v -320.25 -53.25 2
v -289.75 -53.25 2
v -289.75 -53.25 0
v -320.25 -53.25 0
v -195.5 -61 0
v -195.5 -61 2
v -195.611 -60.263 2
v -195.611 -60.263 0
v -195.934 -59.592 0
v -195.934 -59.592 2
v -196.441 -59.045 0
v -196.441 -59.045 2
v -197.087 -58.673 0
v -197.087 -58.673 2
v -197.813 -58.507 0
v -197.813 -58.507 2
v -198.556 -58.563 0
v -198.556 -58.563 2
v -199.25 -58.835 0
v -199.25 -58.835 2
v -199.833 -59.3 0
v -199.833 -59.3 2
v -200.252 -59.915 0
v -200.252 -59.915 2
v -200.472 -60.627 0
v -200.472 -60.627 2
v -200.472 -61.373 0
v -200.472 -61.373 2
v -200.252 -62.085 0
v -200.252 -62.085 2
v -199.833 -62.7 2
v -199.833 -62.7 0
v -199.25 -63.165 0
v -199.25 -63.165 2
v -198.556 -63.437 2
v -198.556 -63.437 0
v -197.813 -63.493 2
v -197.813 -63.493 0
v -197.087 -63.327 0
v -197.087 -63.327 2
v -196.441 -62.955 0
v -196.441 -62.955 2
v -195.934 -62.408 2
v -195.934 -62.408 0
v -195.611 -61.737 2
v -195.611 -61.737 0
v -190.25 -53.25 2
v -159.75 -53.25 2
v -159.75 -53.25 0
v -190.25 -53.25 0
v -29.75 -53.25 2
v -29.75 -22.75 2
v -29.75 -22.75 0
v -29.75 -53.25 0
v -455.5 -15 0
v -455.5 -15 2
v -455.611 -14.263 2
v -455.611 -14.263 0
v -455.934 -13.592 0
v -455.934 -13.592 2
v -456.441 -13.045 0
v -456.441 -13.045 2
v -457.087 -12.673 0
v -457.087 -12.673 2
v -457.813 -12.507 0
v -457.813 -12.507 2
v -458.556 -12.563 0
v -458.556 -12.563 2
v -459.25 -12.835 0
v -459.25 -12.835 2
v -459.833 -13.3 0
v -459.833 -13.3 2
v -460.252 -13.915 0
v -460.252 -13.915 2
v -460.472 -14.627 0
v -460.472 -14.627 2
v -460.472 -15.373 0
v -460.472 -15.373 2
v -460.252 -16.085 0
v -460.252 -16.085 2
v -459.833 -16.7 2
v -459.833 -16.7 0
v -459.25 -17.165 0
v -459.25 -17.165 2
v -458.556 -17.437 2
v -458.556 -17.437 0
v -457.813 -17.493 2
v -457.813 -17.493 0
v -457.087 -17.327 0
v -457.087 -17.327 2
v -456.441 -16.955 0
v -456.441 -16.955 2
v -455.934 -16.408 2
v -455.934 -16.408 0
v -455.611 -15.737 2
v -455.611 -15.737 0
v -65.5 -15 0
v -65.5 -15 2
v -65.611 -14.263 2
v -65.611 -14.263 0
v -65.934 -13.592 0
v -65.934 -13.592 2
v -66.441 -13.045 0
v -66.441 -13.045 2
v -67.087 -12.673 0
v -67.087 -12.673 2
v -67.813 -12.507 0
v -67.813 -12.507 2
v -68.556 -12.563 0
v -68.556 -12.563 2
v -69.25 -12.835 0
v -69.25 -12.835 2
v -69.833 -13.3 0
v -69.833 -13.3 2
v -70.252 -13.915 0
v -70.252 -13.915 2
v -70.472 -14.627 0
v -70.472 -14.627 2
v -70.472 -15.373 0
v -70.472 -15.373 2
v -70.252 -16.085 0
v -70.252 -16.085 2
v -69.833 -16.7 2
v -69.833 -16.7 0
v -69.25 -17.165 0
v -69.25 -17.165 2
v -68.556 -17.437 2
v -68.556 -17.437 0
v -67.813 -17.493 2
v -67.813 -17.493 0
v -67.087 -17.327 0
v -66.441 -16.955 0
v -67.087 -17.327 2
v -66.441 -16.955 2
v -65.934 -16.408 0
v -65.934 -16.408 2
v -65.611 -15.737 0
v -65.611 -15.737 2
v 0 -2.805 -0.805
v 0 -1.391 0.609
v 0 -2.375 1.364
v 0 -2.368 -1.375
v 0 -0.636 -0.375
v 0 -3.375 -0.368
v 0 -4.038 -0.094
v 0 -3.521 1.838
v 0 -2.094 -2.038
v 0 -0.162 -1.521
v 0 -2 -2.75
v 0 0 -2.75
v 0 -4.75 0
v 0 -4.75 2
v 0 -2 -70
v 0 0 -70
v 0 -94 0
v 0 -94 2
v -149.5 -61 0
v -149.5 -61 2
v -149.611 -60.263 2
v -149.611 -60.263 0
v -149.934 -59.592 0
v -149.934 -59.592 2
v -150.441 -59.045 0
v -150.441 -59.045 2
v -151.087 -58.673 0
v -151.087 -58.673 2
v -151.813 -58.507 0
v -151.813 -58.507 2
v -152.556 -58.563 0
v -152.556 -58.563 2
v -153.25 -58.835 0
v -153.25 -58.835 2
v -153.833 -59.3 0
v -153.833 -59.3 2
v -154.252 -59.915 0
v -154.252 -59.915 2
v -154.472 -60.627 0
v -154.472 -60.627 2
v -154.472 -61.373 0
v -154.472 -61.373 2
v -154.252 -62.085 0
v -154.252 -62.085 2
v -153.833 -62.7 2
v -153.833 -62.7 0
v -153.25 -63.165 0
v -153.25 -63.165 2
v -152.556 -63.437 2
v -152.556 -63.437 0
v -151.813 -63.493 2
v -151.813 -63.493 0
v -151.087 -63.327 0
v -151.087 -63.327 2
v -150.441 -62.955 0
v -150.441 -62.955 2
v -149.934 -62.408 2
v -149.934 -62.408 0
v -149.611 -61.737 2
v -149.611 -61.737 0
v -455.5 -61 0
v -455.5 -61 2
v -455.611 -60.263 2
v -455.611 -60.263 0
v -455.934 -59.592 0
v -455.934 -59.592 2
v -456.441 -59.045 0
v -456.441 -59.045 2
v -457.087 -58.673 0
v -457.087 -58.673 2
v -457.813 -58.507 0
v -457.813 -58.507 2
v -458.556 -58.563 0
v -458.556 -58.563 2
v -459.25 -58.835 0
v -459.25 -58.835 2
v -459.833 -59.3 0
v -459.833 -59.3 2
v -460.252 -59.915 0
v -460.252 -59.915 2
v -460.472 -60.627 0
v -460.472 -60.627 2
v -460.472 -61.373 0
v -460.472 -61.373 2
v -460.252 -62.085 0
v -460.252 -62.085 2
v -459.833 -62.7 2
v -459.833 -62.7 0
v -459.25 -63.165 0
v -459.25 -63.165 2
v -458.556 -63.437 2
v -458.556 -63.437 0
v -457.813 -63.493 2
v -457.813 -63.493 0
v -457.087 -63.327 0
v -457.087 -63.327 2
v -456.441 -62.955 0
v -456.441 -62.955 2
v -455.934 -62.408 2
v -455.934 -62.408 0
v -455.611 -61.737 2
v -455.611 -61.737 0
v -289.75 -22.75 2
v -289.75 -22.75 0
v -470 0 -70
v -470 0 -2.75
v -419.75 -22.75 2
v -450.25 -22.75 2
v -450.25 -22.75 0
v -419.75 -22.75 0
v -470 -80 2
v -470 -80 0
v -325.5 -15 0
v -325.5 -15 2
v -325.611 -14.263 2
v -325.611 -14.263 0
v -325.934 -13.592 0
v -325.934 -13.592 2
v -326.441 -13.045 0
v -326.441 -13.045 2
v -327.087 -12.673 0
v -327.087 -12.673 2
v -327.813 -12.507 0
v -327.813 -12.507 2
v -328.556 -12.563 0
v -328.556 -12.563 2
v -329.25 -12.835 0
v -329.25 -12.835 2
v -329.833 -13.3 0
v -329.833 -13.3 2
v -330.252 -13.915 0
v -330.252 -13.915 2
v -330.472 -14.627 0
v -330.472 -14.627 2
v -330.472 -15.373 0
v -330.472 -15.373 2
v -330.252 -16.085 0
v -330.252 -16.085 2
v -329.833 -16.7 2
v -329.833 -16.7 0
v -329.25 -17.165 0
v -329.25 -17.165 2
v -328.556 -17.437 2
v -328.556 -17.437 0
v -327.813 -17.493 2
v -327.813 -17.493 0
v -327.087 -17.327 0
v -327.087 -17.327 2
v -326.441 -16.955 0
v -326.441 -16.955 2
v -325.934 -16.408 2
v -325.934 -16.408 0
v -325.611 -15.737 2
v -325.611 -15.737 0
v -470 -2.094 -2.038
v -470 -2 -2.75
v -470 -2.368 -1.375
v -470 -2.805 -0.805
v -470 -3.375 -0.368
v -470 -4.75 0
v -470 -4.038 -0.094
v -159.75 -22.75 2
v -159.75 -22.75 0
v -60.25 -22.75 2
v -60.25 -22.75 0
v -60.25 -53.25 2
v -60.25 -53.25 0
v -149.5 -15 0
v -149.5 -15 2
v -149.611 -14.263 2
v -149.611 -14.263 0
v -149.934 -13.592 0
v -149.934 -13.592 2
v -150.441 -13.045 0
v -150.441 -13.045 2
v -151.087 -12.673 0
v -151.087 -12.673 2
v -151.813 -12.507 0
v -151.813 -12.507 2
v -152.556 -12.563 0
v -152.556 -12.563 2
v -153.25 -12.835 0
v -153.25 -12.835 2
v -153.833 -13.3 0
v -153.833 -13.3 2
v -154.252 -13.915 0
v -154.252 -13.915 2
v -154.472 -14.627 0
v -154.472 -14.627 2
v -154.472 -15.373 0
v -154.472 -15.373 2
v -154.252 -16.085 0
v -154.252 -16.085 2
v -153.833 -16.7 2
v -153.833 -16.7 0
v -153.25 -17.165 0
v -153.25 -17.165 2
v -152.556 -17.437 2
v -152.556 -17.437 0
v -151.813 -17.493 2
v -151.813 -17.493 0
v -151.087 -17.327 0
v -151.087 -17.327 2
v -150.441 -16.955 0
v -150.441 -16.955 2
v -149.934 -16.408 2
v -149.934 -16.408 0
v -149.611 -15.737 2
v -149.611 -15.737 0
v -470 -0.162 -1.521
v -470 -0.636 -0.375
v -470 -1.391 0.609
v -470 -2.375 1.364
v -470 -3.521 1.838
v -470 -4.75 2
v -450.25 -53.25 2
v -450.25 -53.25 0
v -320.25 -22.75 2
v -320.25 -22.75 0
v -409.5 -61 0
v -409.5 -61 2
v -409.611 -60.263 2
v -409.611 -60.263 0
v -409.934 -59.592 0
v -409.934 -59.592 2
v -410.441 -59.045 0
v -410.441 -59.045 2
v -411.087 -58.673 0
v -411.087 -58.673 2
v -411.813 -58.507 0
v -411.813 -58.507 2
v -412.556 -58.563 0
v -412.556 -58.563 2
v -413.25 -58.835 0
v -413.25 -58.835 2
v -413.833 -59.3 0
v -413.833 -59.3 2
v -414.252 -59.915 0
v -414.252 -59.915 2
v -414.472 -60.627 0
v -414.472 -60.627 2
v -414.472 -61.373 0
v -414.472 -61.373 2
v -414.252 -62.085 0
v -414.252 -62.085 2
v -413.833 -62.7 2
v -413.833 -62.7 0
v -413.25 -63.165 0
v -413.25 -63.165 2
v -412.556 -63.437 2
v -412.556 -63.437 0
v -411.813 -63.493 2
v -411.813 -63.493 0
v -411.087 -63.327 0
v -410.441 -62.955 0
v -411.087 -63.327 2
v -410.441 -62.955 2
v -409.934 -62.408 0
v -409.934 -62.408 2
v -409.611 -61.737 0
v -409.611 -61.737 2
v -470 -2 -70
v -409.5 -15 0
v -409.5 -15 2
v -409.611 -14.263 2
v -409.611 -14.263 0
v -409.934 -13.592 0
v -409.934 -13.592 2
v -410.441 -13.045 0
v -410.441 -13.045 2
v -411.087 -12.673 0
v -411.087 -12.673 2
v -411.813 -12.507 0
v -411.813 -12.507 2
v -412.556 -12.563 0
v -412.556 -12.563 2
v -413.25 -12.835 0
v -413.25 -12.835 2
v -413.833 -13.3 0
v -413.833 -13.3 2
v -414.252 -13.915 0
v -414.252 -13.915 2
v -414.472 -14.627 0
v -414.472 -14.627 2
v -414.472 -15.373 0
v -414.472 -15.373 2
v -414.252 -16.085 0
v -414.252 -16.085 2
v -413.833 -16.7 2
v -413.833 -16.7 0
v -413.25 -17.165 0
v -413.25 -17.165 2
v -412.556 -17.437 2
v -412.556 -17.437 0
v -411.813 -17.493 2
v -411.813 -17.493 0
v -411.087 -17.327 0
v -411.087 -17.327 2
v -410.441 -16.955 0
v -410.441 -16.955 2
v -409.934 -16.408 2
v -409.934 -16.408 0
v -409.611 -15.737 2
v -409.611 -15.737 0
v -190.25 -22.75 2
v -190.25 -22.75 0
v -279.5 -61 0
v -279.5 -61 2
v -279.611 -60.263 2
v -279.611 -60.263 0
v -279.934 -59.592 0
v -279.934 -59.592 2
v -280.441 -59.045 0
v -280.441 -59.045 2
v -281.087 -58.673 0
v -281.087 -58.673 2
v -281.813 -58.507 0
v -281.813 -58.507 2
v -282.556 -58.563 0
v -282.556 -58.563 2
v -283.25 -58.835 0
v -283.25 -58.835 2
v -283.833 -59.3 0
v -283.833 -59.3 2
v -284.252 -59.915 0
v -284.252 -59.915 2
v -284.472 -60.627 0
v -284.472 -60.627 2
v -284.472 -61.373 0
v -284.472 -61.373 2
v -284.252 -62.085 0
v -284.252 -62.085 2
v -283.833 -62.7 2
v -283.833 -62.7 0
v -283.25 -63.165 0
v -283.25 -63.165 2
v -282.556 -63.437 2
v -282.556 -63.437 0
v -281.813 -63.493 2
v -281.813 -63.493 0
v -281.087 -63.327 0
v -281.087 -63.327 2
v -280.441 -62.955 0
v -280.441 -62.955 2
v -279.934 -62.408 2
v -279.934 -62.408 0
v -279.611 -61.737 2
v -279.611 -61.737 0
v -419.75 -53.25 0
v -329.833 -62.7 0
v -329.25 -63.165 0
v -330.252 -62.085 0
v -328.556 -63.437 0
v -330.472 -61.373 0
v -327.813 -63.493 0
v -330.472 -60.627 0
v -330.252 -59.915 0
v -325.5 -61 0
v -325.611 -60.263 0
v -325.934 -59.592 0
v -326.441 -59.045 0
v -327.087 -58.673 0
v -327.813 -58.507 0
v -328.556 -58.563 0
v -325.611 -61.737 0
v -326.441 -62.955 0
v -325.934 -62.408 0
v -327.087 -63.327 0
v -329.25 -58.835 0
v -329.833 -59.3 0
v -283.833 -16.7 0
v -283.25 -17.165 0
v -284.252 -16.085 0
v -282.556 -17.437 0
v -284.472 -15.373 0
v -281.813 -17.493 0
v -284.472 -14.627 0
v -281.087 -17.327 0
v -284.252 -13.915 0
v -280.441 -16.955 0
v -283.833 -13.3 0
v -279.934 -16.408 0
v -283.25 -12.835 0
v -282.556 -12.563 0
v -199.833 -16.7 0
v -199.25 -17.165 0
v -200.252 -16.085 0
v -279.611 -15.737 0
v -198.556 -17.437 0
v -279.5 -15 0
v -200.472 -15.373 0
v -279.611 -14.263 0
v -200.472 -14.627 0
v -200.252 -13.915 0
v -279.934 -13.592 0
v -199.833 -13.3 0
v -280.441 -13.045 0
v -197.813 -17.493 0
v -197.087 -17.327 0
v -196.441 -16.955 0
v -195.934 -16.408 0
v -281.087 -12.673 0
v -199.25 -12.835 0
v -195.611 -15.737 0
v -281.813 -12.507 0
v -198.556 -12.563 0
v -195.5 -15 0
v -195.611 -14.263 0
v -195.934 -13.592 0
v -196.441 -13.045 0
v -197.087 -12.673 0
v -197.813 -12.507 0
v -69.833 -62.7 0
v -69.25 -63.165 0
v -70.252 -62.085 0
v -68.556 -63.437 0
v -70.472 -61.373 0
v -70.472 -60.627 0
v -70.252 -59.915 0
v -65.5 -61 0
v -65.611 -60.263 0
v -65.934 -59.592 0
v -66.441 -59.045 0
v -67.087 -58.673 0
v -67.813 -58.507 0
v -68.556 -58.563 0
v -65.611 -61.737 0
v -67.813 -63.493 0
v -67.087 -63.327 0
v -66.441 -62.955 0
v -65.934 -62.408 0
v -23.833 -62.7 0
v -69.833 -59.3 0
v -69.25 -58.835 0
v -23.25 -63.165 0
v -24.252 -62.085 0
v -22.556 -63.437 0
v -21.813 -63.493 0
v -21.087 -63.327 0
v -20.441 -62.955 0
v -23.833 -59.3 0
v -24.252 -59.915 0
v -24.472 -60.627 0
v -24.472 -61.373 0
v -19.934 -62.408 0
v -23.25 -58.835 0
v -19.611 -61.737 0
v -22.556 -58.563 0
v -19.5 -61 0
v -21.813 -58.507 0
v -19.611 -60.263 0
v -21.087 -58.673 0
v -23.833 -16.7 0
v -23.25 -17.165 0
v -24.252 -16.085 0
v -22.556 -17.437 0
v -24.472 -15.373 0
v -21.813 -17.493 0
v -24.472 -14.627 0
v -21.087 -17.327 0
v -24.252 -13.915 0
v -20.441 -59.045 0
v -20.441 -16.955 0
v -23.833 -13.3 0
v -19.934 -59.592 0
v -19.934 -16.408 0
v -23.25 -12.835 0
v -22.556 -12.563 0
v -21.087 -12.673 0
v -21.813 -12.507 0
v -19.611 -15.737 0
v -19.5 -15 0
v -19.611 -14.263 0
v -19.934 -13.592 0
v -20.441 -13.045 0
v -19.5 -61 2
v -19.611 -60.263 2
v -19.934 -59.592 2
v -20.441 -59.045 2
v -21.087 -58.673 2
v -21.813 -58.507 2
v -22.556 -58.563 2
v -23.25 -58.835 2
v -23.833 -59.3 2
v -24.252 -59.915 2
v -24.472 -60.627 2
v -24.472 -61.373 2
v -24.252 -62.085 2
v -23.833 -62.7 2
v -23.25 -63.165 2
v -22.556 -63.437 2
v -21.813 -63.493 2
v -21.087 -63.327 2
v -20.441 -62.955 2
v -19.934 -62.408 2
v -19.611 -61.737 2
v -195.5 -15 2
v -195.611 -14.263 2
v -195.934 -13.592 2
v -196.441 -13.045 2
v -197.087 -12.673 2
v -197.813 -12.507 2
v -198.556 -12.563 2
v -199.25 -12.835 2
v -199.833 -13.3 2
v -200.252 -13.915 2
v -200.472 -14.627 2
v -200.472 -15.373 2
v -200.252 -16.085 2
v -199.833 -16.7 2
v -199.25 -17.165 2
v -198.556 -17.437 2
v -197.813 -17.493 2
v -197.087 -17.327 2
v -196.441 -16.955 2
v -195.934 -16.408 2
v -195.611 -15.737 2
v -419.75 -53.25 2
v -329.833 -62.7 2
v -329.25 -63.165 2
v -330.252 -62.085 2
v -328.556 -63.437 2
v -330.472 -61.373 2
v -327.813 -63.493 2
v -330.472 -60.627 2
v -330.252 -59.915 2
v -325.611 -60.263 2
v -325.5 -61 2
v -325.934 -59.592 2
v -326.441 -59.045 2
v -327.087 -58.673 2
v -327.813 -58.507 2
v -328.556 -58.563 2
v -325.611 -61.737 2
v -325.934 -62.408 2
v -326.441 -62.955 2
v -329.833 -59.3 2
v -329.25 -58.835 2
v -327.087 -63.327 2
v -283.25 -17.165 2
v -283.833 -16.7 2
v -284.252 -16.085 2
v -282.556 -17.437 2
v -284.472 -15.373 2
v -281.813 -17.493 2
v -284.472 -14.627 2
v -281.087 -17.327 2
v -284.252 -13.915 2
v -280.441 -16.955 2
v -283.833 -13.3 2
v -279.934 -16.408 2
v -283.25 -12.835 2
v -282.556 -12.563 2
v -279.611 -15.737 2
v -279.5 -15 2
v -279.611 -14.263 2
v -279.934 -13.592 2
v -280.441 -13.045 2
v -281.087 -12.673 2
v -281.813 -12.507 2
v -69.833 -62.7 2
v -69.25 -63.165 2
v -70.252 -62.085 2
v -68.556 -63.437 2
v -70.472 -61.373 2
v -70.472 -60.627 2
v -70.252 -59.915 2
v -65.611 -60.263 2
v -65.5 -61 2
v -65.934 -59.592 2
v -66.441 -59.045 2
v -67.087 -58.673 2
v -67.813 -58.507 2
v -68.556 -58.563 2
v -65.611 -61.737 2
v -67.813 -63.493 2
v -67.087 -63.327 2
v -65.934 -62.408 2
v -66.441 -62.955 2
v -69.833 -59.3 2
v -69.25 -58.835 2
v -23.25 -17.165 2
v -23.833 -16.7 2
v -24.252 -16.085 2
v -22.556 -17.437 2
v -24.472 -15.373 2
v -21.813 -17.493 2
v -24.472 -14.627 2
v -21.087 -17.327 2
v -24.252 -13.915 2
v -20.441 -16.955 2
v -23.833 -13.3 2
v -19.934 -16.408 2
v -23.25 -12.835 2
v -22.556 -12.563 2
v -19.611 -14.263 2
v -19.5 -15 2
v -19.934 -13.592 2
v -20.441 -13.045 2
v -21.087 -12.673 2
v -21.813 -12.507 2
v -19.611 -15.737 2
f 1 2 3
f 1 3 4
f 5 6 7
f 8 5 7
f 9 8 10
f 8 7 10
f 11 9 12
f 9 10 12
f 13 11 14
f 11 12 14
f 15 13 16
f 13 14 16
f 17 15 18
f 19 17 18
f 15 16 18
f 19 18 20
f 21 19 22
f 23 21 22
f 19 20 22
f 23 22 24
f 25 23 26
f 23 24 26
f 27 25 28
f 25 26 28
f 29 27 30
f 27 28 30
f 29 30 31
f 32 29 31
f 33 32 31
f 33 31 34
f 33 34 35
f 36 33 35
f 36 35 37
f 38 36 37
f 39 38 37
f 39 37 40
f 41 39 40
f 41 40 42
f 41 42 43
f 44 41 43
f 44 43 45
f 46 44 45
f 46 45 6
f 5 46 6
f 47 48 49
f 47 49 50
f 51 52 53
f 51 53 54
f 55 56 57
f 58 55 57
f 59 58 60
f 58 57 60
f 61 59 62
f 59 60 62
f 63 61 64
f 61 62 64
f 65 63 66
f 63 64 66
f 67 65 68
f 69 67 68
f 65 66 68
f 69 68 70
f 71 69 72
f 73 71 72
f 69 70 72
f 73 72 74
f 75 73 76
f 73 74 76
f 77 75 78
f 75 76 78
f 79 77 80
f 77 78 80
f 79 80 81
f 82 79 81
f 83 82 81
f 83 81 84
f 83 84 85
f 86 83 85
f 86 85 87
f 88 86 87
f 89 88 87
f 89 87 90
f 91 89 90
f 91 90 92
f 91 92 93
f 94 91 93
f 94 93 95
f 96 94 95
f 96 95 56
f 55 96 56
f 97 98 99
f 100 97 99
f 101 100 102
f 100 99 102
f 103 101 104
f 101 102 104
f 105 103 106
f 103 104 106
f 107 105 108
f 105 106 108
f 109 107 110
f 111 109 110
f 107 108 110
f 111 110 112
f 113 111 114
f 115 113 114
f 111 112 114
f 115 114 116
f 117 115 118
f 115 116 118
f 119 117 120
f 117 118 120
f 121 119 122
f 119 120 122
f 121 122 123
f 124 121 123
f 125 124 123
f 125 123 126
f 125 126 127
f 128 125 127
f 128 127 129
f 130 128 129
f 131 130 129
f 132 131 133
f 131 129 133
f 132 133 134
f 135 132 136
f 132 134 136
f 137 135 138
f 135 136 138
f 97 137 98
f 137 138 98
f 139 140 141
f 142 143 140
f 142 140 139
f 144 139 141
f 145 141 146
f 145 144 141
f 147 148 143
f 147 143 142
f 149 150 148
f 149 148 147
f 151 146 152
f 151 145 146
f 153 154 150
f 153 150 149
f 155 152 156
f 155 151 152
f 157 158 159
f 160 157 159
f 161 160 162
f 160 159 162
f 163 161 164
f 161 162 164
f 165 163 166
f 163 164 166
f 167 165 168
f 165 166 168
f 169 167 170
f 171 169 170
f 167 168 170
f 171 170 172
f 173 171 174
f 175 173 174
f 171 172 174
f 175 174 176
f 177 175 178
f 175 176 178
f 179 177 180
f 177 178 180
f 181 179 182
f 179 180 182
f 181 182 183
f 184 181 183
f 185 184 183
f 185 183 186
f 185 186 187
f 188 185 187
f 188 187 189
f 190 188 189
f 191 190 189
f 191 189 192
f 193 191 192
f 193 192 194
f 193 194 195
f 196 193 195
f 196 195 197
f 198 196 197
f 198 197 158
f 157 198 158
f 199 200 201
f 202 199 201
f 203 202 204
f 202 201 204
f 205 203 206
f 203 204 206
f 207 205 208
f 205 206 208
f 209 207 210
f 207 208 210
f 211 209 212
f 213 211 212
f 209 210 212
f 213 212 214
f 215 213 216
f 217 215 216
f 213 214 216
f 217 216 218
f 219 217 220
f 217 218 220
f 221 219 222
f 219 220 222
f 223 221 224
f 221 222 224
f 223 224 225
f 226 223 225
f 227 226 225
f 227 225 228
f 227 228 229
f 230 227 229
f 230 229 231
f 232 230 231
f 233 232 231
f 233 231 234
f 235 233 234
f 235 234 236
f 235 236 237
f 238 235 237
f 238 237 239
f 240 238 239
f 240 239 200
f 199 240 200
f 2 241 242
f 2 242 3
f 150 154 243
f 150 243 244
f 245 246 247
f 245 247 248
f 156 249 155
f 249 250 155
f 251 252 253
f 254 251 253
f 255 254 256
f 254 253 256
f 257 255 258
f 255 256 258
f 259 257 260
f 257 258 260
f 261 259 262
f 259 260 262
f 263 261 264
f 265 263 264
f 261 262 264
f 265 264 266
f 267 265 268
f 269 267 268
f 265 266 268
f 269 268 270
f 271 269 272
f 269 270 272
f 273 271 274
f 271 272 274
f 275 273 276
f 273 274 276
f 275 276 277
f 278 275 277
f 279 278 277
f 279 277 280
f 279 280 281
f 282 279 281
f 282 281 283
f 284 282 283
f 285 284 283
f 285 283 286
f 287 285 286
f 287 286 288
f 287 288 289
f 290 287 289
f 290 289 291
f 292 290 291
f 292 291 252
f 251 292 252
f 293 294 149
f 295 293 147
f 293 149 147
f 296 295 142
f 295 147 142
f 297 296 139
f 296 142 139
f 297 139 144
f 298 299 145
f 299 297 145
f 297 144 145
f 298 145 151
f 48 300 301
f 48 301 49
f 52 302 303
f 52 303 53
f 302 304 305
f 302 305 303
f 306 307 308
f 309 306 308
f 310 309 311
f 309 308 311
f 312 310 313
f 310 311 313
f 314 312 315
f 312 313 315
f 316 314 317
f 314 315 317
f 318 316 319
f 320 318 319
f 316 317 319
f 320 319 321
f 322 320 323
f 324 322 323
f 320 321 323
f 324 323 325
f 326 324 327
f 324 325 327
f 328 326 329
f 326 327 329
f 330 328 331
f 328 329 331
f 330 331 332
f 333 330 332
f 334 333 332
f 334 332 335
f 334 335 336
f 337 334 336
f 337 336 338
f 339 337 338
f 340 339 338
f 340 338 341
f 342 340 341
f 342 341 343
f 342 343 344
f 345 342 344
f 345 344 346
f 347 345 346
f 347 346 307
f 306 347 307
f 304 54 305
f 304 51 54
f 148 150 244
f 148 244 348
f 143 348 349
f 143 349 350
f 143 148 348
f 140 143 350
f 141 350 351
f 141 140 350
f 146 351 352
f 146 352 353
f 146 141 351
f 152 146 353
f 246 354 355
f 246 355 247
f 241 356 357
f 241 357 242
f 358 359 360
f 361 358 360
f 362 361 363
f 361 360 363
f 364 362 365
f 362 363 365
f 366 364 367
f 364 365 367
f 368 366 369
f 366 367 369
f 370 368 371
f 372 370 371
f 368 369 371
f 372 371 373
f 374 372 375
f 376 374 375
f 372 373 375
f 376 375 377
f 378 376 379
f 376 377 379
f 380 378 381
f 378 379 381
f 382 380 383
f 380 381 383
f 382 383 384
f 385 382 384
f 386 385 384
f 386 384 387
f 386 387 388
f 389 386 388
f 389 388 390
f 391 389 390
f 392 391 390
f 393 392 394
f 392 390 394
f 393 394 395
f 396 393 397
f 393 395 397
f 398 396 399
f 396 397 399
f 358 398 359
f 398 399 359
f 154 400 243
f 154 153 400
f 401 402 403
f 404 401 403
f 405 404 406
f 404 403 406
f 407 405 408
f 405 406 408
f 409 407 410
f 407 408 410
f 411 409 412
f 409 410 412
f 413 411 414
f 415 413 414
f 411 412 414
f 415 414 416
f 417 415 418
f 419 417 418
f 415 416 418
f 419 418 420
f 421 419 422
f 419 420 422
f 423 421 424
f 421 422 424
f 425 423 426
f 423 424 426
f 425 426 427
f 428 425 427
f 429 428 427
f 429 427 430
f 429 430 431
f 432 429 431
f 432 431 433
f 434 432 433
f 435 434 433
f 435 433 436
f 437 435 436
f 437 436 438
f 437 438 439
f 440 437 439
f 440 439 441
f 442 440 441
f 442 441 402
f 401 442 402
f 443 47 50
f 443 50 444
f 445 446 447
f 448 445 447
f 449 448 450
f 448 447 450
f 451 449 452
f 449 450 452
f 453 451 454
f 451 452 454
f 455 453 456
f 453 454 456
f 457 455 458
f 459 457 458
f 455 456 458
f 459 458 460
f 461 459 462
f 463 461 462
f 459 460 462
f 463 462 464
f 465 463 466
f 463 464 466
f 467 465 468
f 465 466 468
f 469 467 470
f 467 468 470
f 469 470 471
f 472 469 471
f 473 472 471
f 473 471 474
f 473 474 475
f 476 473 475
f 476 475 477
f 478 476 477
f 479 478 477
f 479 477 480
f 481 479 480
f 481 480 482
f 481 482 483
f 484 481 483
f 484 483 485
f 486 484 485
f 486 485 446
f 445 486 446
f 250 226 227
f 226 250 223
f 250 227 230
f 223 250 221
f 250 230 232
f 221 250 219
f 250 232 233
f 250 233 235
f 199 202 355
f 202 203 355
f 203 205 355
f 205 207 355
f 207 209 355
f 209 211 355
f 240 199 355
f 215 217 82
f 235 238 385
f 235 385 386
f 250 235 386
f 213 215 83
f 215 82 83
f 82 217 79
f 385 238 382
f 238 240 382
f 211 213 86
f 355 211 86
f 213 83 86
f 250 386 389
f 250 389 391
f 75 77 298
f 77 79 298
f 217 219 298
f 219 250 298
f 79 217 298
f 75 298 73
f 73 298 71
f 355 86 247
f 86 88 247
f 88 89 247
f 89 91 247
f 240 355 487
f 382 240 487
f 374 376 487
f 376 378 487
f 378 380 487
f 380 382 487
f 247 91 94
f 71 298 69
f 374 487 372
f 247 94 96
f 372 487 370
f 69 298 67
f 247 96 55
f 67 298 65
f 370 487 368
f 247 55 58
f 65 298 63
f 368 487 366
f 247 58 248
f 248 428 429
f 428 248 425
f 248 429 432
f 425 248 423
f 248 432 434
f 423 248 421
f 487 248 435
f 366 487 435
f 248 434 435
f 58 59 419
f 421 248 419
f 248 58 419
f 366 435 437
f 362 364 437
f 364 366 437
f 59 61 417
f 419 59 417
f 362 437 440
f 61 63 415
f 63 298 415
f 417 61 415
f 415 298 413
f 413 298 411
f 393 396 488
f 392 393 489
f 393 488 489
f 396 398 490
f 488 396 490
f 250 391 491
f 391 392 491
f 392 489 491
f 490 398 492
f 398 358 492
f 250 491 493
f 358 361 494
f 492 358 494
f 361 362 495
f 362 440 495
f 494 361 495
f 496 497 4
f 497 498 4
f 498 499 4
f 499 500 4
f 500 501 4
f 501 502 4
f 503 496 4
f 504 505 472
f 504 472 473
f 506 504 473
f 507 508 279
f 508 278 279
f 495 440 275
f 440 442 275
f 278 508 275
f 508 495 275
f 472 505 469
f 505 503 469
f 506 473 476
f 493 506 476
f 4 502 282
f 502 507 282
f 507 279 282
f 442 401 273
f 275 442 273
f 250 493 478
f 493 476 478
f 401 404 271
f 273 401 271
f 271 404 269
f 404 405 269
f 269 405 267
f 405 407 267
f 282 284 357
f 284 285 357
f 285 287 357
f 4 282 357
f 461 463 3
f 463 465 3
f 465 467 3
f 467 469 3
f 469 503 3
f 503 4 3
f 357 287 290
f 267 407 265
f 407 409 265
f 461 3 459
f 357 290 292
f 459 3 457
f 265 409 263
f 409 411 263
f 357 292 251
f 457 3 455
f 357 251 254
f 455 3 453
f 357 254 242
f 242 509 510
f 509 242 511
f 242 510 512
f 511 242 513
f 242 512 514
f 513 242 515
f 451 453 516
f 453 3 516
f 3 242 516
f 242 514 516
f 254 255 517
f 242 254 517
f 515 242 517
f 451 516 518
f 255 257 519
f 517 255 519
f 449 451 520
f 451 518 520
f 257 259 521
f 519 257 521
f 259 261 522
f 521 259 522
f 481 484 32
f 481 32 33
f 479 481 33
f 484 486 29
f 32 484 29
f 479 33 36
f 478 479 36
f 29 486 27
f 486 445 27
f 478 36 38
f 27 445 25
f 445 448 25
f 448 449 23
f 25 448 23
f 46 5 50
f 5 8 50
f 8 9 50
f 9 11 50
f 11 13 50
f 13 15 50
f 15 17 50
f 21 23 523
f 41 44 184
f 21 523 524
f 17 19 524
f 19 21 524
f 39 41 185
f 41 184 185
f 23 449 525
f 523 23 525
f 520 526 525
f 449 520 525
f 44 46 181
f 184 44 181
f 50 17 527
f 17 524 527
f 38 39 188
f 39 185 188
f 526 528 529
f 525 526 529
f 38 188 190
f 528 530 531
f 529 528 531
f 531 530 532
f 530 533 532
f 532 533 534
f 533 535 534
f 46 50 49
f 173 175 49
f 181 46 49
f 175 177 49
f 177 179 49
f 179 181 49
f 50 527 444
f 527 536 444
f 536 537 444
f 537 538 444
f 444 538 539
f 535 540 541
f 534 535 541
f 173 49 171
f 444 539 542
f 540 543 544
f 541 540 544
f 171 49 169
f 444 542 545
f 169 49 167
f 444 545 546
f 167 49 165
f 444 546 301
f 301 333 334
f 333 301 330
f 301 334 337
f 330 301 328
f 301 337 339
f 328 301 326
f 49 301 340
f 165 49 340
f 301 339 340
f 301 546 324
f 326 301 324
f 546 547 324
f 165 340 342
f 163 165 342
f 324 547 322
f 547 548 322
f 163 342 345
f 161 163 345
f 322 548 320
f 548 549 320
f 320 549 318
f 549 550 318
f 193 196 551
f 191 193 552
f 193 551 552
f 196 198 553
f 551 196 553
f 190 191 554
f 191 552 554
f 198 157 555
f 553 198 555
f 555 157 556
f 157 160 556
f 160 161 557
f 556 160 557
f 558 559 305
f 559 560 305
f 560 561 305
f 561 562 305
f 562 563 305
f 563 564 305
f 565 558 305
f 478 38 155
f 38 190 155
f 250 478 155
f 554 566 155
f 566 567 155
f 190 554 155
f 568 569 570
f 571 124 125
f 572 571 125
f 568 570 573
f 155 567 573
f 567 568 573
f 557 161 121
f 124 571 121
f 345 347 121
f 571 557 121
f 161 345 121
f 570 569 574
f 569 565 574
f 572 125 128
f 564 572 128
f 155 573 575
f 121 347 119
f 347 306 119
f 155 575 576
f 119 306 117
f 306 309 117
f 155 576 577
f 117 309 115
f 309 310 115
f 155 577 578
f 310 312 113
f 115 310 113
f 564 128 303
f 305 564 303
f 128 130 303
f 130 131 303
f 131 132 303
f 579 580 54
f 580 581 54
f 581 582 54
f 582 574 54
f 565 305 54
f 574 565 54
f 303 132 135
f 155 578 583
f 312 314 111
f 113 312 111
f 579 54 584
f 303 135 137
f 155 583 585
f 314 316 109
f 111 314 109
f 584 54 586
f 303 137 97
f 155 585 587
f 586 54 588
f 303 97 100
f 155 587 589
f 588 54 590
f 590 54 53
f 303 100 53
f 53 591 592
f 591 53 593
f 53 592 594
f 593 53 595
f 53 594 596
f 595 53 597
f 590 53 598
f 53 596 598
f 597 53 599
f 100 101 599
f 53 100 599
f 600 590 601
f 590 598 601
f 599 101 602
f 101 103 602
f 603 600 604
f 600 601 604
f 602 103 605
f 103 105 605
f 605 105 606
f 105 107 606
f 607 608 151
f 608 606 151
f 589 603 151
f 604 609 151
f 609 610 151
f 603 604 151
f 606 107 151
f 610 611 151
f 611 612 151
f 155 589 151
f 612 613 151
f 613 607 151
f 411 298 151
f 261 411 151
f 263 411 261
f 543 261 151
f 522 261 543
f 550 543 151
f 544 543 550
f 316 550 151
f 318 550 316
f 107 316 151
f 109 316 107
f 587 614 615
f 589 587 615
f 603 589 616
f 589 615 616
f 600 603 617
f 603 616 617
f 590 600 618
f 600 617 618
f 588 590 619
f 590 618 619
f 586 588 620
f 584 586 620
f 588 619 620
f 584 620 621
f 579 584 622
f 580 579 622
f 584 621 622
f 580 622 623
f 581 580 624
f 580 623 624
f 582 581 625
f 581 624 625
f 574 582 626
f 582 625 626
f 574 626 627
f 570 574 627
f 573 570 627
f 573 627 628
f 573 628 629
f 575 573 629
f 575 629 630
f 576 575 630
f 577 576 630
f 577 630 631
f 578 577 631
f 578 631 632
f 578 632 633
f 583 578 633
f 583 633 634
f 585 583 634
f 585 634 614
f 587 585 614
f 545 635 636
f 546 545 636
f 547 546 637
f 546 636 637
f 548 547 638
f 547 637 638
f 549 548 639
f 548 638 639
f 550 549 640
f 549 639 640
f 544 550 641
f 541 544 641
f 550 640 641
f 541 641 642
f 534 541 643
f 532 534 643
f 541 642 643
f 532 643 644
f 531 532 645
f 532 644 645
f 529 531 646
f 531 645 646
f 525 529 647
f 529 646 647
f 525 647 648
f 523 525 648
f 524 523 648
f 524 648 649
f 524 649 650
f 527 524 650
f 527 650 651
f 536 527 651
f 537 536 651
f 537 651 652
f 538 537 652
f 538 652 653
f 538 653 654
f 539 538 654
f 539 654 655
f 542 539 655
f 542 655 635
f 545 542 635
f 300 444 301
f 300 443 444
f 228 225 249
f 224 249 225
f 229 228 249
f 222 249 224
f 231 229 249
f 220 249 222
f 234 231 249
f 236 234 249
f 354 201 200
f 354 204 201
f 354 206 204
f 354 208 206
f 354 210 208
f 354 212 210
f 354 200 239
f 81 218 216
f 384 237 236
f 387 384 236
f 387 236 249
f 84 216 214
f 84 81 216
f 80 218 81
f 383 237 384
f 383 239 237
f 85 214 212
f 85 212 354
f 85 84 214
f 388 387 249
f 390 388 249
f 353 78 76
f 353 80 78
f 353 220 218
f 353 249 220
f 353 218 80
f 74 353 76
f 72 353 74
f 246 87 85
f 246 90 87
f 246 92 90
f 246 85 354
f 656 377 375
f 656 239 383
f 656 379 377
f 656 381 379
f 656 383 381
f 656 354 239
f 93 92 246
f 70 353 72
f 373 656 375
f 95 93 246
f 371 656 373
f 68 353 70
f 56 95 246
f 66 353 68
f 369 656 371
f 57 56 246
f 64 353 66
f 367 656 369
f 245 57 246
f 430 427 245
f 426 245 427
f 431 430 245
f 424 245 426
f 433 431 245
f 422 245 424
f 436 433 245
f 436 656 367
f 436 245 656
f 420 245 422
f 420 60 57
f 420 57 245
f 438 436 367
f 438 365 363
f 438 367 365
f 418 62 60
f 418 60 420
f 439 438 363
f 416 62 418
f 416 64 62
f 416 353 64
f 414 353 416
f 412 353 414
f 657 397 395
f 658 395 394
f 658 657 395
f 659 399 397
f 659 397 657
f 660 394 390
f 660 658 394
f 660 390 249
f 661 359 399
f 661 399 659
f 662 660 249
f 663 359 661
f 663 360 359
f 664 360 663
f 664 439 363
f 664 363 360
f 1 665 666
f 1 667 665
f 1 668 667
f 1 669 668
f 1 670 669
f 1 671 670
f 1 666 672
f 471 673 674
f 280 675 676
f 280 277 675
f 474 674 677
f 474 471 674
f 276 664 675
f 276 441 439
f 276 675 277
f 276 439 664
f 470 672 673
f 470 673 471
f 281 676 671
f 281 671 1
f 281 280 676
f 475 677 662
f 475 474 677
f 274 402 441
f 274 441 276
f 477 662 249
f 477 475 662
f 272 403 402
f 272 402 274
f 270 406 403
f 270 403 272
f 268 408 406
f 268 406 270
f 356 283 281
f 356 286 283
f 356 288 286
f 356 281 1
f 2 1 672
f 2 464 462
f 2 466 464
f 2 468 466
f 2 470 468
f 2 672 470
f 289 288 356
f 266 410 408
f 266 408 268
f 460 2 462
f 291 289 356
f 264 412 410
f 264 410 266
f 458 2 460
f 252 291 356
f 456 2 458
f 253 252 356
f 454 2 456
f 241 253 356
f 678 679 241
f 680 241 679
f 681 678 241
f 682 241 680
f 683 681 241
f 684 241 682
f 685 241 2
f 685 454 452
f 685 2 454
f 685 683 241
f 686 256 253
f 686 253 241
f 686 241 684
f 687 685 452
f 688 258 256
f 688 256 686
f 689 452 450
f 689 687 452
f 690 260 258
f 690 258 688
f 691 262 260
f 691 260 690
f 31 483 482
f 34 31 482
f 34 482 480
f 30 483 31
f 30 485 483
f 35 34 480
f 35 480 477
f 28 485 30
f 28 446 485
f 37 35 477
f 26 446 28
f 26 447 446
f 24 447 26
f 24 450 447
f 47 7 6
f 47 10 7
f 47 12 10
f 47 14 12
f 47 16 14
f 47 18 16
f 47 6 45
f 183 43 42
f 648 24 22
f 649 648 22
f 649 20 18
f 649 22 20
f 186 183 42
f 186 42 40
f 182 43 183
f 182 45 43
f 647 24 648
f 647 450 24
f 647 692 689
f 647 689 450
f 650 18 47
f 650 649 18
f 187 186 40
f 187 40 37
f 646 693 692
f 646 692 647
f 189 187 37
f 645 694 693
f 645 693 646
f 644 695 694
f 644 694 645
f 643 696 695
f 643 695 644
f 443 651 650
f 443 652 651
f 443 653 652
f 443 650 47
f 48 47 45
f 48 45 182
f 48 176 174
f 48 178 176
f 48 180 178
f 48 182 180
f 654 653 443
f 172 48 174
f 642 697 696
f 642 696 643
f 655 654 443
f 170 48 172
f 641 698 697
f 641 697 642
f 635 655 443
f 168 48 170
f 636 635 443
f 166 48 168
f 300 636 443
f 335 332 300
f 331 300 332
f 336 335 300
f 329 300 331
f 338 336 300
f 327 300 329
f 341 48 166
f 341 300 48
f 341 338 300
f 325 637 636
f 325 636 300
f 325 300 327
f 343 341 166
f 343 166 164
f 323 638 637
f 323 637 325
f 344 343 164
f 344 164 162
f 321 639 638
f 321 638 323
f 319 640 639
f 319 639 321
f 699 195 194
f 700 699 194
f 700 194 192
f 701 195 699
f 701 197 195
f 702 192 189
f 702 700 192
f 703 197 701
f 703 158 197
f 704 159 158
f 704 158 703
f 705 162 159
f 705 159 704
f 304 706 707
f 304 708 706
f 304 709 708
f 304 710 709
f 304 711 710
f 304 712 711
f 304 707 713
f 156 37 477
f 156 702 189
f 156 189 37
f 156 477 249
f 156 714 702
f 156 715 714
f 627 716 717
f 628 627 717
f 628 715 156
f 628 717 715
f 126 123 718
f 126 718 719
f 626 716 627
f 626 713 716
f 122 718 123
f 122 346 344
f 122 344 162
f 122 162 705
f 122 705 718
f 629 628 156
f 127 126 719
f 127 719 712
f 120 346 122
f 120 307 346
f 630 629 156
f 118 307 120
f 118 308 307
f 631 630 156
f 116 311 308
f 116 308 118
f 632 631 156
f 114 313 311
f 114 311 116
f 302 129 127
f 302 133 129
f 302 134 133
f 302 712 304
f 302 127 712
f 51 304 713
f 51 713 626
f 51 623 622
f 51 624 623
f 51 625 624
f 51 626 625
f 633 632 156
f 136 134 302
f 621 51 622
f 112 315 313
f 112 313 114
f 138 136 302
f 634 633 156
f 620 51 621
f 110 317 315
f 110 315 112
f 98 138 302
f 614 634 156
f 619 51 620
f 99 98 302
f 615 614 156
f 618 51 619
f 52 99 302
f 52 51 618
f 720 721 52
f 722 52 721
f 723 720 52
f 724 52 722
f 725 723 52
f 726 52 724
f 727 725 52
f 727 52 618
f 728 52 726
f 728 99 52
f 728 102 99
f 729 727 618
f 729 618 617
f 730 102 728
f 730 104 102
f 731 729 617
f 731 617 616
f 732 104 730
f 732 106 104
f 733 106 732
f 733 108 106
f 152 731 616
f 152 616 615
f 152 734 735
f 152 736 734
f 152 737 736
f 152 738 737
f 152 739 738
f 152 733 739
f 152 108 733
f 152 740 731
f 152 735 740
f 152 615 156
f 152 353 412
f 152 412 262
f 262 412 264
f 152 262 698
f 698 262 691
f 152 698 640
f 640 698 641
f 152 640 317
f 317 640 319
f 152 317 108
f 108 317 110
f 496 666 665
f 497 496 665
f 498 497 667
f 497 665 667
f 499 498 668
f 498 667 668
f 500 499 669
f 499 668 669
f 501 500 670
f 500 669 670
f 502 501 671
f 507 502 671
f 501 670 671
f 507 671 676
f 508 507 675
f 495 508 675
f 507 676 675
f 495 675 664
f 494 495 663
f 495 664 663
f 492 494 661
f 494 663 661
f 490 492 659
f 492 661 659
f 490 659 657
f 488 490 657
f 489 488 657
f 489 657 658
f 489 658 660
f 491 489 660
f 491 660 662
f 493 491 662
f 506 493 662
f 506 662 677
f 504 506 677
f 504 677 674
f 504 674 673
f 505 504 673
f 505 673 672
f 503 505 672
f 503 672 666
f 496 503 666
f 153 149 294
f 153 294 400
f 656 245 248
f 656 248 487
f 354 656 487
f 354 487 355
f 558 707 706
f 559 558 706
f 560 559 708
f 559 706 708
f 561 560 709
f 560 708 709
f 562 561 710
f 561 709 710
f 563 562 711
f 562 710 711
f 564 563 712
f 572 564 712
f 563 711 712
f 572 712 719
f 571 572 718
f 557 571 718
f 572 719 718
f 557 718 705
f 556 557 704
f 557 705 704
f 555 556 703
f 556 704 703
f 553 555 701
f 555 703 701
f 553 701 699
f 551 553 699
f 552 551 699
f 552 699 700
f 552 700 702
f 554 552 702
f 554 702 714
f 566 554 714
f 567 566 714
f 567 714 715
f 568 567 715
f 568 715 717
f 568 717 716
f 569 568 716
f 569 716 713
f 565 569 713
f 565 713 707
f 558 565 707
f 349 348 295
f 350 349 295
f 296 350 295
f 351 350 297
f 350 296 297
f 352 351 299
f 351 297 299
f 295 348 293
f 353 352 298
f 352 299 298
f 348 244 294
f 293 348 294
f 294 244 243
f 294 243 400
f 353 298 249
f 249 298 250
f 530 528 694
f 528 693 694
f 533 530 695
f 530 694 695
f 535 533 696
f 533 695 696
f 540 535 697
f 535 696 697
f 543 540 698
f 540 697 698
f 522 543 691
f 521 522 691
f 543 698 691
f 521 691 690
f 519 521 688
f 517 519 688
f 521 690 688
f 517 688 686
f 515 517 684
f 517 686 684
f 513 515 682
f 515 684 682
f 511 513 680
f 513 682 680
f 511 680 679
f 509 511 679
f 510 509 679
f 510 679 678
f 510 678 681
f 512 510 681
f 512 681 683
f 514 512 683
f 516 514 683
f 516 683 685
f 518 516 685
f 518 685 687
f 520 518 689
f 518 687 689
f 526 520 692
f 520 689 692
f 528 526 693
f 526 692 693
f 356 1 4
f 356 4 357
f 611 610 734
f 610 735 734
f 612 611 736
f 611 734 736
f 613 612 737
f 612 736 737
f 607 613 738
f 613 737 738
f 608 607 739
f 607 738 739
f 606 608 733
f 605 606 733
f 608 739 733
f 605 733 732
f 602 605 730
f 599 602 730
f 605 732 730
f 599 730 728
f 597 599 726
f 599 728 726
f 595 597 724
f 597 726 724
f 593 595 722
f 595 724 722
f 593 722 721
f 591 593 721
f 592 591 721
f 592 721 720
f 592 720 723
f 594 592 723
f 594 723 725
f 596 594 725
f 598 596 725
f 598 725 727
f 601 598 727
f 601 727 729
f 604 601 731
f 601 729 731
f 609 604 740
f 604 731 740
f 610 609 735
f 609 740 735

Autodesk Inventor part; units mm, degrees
ref_plane "YZ Plane" through (0, 0, 0) normal (1, 0, 0) x (0, 1, 0)
ref_plane "XZ Plane" through (0, 0, 0) normal (0, 1, 0) x (-1, 0, 0)
ref_plane "XY Plane" through (0, 0, 0) normal (0, 0, 1) x (1, 0, 0)
sketch "Sketch1" plane through (0, 0, 0) normal (0, 0, 1) x (1, 0, 0)
  line L0 (0, 0) -> (-470, 0)
  line L1 (0, -94) -> (0, 0)
  line L2 (-470, 0) -> (-470, -80)
  line L3 (-470, -80) -> (0, -94)
  point P0 (0, -47)
  dimension "d32" = 94
  dimension "d60" = 80
  dimension "d61" = 470
extrude "Plate1" add sketch "Sketch1" along normal blind 2
sketch "Sketch8" plane through (0, 0, 2) normal (0, 0, 1) x (1, 0, 0)
  line L0 (-29.75, -53.25) -> (-60.25, -53.25)
  line L1 (-60.25, -53.25) -> (-60.25, -22.75)
  line L2 (-60.25, -22.75) -> (-29.75, -22.75)
  line L3 (-29.75, -22.75) -> (-29.75, -53.25)
  line L4 (-29.75, -53.25) -> (-60.25, -22.75) construction
  line L5 (-60.25, -53.25) -> (-29.75, -22.75) construction
  circle A0 centre (-22, -61) radius 2.5
  circle A1 centre (-68, -61) radius 2.5
  circle A2 centre (-68, -15) radius 2.5
  circle A3 centre (-22, -15) radius 2.5
  line L6 (0, 0) -> (0, -94) projected
  line L7 (-470, 0) -> (0, 0) projected
  line L8 (-60.25, -53.25) -> (-68, -61) construction
  line L9 (-68, -15) -> (-22, -15) construction
  line L10 (-22, -15) -> (-22, -61) construction
  line L11 (-22, -61) -> (-68, -61) construction
  line L12 (-68, -61) -> (-68, -15) construction
  point P0 (-45, -38)
  dimension "d51" = 30.5
  dimension "d52" = 30.5
  dimension "d53" = 5
  dimension "d72" = 45
  dimension "d78" = 46
  dimension "d79" = 15
extrude "Cut3" cut sketch "Sketch8" against normal blind 2
pattern_linear "Rectangular Pattern1" count 4 spacing 130 along (-1, 0, 0) of "Cut3"
sketch "Sketch9" plane through (0, -2, 2) normal (0, 1, 0) x (-1, 0, 0)
  line L0 (470, 0) -> (0, 0)
  line L1 (0, 0) -> (0, -72)
  line L2 (0, -72) -> (470, -72)
  line L3 (470, -72) -> (470, 0)
edge flange "Flange3" height 72 angle 90 thickness 2 bend radius 2.75 thickness toward (0, 1, 0) relief round relief width 2 relief depth 1 edges at (-235, 0, 0) wall of the first edge with corners at (-470, -2, 2) (0, -2, 2) (0, -2, -70) (-470, -2, -70)
bend "Bend3"
corner "Corner3"
equation "\"d51\" = d52"
equation "\"d55\" = Thickness"
equation "\"d2\" = Thickness"
equation "\"d62\" = BendReliefWidth"
equation "\"d63\" = BendReliefDepth"
equation "\"d64\" = MinimumRemnant"
equation "\"d65\" = TransitionRadius"
equation "\"d68\" = BendRadius"
equation "\"d69\" = CornerReliefSize"
equation "\"d70\" = GapSize"
equation "\"d71\" = JacobiRadiusSize"
equation "\"BendReliefWidth\" = Thickness"
equation "\"BendReliefDepth\" = 0.5 * Thickness"
equation "\"CornerReliefSize\" = 4 * Thickness"
equation "\"MinimumRemnant\" = 2 * Thickness"
equation "\"TransitionRadius\" = BendRadius"
equation "\"JacobiRadiusSize\" = BendRadius"
equation "\"GapSize\" = Thickness"
equation "\"Thickness\" = 2"
equation "\"BendRadius\" = 2.75"
properties part number "PRS 1422 DrSysB diameter way up_1200" material "Stainless Steel"
